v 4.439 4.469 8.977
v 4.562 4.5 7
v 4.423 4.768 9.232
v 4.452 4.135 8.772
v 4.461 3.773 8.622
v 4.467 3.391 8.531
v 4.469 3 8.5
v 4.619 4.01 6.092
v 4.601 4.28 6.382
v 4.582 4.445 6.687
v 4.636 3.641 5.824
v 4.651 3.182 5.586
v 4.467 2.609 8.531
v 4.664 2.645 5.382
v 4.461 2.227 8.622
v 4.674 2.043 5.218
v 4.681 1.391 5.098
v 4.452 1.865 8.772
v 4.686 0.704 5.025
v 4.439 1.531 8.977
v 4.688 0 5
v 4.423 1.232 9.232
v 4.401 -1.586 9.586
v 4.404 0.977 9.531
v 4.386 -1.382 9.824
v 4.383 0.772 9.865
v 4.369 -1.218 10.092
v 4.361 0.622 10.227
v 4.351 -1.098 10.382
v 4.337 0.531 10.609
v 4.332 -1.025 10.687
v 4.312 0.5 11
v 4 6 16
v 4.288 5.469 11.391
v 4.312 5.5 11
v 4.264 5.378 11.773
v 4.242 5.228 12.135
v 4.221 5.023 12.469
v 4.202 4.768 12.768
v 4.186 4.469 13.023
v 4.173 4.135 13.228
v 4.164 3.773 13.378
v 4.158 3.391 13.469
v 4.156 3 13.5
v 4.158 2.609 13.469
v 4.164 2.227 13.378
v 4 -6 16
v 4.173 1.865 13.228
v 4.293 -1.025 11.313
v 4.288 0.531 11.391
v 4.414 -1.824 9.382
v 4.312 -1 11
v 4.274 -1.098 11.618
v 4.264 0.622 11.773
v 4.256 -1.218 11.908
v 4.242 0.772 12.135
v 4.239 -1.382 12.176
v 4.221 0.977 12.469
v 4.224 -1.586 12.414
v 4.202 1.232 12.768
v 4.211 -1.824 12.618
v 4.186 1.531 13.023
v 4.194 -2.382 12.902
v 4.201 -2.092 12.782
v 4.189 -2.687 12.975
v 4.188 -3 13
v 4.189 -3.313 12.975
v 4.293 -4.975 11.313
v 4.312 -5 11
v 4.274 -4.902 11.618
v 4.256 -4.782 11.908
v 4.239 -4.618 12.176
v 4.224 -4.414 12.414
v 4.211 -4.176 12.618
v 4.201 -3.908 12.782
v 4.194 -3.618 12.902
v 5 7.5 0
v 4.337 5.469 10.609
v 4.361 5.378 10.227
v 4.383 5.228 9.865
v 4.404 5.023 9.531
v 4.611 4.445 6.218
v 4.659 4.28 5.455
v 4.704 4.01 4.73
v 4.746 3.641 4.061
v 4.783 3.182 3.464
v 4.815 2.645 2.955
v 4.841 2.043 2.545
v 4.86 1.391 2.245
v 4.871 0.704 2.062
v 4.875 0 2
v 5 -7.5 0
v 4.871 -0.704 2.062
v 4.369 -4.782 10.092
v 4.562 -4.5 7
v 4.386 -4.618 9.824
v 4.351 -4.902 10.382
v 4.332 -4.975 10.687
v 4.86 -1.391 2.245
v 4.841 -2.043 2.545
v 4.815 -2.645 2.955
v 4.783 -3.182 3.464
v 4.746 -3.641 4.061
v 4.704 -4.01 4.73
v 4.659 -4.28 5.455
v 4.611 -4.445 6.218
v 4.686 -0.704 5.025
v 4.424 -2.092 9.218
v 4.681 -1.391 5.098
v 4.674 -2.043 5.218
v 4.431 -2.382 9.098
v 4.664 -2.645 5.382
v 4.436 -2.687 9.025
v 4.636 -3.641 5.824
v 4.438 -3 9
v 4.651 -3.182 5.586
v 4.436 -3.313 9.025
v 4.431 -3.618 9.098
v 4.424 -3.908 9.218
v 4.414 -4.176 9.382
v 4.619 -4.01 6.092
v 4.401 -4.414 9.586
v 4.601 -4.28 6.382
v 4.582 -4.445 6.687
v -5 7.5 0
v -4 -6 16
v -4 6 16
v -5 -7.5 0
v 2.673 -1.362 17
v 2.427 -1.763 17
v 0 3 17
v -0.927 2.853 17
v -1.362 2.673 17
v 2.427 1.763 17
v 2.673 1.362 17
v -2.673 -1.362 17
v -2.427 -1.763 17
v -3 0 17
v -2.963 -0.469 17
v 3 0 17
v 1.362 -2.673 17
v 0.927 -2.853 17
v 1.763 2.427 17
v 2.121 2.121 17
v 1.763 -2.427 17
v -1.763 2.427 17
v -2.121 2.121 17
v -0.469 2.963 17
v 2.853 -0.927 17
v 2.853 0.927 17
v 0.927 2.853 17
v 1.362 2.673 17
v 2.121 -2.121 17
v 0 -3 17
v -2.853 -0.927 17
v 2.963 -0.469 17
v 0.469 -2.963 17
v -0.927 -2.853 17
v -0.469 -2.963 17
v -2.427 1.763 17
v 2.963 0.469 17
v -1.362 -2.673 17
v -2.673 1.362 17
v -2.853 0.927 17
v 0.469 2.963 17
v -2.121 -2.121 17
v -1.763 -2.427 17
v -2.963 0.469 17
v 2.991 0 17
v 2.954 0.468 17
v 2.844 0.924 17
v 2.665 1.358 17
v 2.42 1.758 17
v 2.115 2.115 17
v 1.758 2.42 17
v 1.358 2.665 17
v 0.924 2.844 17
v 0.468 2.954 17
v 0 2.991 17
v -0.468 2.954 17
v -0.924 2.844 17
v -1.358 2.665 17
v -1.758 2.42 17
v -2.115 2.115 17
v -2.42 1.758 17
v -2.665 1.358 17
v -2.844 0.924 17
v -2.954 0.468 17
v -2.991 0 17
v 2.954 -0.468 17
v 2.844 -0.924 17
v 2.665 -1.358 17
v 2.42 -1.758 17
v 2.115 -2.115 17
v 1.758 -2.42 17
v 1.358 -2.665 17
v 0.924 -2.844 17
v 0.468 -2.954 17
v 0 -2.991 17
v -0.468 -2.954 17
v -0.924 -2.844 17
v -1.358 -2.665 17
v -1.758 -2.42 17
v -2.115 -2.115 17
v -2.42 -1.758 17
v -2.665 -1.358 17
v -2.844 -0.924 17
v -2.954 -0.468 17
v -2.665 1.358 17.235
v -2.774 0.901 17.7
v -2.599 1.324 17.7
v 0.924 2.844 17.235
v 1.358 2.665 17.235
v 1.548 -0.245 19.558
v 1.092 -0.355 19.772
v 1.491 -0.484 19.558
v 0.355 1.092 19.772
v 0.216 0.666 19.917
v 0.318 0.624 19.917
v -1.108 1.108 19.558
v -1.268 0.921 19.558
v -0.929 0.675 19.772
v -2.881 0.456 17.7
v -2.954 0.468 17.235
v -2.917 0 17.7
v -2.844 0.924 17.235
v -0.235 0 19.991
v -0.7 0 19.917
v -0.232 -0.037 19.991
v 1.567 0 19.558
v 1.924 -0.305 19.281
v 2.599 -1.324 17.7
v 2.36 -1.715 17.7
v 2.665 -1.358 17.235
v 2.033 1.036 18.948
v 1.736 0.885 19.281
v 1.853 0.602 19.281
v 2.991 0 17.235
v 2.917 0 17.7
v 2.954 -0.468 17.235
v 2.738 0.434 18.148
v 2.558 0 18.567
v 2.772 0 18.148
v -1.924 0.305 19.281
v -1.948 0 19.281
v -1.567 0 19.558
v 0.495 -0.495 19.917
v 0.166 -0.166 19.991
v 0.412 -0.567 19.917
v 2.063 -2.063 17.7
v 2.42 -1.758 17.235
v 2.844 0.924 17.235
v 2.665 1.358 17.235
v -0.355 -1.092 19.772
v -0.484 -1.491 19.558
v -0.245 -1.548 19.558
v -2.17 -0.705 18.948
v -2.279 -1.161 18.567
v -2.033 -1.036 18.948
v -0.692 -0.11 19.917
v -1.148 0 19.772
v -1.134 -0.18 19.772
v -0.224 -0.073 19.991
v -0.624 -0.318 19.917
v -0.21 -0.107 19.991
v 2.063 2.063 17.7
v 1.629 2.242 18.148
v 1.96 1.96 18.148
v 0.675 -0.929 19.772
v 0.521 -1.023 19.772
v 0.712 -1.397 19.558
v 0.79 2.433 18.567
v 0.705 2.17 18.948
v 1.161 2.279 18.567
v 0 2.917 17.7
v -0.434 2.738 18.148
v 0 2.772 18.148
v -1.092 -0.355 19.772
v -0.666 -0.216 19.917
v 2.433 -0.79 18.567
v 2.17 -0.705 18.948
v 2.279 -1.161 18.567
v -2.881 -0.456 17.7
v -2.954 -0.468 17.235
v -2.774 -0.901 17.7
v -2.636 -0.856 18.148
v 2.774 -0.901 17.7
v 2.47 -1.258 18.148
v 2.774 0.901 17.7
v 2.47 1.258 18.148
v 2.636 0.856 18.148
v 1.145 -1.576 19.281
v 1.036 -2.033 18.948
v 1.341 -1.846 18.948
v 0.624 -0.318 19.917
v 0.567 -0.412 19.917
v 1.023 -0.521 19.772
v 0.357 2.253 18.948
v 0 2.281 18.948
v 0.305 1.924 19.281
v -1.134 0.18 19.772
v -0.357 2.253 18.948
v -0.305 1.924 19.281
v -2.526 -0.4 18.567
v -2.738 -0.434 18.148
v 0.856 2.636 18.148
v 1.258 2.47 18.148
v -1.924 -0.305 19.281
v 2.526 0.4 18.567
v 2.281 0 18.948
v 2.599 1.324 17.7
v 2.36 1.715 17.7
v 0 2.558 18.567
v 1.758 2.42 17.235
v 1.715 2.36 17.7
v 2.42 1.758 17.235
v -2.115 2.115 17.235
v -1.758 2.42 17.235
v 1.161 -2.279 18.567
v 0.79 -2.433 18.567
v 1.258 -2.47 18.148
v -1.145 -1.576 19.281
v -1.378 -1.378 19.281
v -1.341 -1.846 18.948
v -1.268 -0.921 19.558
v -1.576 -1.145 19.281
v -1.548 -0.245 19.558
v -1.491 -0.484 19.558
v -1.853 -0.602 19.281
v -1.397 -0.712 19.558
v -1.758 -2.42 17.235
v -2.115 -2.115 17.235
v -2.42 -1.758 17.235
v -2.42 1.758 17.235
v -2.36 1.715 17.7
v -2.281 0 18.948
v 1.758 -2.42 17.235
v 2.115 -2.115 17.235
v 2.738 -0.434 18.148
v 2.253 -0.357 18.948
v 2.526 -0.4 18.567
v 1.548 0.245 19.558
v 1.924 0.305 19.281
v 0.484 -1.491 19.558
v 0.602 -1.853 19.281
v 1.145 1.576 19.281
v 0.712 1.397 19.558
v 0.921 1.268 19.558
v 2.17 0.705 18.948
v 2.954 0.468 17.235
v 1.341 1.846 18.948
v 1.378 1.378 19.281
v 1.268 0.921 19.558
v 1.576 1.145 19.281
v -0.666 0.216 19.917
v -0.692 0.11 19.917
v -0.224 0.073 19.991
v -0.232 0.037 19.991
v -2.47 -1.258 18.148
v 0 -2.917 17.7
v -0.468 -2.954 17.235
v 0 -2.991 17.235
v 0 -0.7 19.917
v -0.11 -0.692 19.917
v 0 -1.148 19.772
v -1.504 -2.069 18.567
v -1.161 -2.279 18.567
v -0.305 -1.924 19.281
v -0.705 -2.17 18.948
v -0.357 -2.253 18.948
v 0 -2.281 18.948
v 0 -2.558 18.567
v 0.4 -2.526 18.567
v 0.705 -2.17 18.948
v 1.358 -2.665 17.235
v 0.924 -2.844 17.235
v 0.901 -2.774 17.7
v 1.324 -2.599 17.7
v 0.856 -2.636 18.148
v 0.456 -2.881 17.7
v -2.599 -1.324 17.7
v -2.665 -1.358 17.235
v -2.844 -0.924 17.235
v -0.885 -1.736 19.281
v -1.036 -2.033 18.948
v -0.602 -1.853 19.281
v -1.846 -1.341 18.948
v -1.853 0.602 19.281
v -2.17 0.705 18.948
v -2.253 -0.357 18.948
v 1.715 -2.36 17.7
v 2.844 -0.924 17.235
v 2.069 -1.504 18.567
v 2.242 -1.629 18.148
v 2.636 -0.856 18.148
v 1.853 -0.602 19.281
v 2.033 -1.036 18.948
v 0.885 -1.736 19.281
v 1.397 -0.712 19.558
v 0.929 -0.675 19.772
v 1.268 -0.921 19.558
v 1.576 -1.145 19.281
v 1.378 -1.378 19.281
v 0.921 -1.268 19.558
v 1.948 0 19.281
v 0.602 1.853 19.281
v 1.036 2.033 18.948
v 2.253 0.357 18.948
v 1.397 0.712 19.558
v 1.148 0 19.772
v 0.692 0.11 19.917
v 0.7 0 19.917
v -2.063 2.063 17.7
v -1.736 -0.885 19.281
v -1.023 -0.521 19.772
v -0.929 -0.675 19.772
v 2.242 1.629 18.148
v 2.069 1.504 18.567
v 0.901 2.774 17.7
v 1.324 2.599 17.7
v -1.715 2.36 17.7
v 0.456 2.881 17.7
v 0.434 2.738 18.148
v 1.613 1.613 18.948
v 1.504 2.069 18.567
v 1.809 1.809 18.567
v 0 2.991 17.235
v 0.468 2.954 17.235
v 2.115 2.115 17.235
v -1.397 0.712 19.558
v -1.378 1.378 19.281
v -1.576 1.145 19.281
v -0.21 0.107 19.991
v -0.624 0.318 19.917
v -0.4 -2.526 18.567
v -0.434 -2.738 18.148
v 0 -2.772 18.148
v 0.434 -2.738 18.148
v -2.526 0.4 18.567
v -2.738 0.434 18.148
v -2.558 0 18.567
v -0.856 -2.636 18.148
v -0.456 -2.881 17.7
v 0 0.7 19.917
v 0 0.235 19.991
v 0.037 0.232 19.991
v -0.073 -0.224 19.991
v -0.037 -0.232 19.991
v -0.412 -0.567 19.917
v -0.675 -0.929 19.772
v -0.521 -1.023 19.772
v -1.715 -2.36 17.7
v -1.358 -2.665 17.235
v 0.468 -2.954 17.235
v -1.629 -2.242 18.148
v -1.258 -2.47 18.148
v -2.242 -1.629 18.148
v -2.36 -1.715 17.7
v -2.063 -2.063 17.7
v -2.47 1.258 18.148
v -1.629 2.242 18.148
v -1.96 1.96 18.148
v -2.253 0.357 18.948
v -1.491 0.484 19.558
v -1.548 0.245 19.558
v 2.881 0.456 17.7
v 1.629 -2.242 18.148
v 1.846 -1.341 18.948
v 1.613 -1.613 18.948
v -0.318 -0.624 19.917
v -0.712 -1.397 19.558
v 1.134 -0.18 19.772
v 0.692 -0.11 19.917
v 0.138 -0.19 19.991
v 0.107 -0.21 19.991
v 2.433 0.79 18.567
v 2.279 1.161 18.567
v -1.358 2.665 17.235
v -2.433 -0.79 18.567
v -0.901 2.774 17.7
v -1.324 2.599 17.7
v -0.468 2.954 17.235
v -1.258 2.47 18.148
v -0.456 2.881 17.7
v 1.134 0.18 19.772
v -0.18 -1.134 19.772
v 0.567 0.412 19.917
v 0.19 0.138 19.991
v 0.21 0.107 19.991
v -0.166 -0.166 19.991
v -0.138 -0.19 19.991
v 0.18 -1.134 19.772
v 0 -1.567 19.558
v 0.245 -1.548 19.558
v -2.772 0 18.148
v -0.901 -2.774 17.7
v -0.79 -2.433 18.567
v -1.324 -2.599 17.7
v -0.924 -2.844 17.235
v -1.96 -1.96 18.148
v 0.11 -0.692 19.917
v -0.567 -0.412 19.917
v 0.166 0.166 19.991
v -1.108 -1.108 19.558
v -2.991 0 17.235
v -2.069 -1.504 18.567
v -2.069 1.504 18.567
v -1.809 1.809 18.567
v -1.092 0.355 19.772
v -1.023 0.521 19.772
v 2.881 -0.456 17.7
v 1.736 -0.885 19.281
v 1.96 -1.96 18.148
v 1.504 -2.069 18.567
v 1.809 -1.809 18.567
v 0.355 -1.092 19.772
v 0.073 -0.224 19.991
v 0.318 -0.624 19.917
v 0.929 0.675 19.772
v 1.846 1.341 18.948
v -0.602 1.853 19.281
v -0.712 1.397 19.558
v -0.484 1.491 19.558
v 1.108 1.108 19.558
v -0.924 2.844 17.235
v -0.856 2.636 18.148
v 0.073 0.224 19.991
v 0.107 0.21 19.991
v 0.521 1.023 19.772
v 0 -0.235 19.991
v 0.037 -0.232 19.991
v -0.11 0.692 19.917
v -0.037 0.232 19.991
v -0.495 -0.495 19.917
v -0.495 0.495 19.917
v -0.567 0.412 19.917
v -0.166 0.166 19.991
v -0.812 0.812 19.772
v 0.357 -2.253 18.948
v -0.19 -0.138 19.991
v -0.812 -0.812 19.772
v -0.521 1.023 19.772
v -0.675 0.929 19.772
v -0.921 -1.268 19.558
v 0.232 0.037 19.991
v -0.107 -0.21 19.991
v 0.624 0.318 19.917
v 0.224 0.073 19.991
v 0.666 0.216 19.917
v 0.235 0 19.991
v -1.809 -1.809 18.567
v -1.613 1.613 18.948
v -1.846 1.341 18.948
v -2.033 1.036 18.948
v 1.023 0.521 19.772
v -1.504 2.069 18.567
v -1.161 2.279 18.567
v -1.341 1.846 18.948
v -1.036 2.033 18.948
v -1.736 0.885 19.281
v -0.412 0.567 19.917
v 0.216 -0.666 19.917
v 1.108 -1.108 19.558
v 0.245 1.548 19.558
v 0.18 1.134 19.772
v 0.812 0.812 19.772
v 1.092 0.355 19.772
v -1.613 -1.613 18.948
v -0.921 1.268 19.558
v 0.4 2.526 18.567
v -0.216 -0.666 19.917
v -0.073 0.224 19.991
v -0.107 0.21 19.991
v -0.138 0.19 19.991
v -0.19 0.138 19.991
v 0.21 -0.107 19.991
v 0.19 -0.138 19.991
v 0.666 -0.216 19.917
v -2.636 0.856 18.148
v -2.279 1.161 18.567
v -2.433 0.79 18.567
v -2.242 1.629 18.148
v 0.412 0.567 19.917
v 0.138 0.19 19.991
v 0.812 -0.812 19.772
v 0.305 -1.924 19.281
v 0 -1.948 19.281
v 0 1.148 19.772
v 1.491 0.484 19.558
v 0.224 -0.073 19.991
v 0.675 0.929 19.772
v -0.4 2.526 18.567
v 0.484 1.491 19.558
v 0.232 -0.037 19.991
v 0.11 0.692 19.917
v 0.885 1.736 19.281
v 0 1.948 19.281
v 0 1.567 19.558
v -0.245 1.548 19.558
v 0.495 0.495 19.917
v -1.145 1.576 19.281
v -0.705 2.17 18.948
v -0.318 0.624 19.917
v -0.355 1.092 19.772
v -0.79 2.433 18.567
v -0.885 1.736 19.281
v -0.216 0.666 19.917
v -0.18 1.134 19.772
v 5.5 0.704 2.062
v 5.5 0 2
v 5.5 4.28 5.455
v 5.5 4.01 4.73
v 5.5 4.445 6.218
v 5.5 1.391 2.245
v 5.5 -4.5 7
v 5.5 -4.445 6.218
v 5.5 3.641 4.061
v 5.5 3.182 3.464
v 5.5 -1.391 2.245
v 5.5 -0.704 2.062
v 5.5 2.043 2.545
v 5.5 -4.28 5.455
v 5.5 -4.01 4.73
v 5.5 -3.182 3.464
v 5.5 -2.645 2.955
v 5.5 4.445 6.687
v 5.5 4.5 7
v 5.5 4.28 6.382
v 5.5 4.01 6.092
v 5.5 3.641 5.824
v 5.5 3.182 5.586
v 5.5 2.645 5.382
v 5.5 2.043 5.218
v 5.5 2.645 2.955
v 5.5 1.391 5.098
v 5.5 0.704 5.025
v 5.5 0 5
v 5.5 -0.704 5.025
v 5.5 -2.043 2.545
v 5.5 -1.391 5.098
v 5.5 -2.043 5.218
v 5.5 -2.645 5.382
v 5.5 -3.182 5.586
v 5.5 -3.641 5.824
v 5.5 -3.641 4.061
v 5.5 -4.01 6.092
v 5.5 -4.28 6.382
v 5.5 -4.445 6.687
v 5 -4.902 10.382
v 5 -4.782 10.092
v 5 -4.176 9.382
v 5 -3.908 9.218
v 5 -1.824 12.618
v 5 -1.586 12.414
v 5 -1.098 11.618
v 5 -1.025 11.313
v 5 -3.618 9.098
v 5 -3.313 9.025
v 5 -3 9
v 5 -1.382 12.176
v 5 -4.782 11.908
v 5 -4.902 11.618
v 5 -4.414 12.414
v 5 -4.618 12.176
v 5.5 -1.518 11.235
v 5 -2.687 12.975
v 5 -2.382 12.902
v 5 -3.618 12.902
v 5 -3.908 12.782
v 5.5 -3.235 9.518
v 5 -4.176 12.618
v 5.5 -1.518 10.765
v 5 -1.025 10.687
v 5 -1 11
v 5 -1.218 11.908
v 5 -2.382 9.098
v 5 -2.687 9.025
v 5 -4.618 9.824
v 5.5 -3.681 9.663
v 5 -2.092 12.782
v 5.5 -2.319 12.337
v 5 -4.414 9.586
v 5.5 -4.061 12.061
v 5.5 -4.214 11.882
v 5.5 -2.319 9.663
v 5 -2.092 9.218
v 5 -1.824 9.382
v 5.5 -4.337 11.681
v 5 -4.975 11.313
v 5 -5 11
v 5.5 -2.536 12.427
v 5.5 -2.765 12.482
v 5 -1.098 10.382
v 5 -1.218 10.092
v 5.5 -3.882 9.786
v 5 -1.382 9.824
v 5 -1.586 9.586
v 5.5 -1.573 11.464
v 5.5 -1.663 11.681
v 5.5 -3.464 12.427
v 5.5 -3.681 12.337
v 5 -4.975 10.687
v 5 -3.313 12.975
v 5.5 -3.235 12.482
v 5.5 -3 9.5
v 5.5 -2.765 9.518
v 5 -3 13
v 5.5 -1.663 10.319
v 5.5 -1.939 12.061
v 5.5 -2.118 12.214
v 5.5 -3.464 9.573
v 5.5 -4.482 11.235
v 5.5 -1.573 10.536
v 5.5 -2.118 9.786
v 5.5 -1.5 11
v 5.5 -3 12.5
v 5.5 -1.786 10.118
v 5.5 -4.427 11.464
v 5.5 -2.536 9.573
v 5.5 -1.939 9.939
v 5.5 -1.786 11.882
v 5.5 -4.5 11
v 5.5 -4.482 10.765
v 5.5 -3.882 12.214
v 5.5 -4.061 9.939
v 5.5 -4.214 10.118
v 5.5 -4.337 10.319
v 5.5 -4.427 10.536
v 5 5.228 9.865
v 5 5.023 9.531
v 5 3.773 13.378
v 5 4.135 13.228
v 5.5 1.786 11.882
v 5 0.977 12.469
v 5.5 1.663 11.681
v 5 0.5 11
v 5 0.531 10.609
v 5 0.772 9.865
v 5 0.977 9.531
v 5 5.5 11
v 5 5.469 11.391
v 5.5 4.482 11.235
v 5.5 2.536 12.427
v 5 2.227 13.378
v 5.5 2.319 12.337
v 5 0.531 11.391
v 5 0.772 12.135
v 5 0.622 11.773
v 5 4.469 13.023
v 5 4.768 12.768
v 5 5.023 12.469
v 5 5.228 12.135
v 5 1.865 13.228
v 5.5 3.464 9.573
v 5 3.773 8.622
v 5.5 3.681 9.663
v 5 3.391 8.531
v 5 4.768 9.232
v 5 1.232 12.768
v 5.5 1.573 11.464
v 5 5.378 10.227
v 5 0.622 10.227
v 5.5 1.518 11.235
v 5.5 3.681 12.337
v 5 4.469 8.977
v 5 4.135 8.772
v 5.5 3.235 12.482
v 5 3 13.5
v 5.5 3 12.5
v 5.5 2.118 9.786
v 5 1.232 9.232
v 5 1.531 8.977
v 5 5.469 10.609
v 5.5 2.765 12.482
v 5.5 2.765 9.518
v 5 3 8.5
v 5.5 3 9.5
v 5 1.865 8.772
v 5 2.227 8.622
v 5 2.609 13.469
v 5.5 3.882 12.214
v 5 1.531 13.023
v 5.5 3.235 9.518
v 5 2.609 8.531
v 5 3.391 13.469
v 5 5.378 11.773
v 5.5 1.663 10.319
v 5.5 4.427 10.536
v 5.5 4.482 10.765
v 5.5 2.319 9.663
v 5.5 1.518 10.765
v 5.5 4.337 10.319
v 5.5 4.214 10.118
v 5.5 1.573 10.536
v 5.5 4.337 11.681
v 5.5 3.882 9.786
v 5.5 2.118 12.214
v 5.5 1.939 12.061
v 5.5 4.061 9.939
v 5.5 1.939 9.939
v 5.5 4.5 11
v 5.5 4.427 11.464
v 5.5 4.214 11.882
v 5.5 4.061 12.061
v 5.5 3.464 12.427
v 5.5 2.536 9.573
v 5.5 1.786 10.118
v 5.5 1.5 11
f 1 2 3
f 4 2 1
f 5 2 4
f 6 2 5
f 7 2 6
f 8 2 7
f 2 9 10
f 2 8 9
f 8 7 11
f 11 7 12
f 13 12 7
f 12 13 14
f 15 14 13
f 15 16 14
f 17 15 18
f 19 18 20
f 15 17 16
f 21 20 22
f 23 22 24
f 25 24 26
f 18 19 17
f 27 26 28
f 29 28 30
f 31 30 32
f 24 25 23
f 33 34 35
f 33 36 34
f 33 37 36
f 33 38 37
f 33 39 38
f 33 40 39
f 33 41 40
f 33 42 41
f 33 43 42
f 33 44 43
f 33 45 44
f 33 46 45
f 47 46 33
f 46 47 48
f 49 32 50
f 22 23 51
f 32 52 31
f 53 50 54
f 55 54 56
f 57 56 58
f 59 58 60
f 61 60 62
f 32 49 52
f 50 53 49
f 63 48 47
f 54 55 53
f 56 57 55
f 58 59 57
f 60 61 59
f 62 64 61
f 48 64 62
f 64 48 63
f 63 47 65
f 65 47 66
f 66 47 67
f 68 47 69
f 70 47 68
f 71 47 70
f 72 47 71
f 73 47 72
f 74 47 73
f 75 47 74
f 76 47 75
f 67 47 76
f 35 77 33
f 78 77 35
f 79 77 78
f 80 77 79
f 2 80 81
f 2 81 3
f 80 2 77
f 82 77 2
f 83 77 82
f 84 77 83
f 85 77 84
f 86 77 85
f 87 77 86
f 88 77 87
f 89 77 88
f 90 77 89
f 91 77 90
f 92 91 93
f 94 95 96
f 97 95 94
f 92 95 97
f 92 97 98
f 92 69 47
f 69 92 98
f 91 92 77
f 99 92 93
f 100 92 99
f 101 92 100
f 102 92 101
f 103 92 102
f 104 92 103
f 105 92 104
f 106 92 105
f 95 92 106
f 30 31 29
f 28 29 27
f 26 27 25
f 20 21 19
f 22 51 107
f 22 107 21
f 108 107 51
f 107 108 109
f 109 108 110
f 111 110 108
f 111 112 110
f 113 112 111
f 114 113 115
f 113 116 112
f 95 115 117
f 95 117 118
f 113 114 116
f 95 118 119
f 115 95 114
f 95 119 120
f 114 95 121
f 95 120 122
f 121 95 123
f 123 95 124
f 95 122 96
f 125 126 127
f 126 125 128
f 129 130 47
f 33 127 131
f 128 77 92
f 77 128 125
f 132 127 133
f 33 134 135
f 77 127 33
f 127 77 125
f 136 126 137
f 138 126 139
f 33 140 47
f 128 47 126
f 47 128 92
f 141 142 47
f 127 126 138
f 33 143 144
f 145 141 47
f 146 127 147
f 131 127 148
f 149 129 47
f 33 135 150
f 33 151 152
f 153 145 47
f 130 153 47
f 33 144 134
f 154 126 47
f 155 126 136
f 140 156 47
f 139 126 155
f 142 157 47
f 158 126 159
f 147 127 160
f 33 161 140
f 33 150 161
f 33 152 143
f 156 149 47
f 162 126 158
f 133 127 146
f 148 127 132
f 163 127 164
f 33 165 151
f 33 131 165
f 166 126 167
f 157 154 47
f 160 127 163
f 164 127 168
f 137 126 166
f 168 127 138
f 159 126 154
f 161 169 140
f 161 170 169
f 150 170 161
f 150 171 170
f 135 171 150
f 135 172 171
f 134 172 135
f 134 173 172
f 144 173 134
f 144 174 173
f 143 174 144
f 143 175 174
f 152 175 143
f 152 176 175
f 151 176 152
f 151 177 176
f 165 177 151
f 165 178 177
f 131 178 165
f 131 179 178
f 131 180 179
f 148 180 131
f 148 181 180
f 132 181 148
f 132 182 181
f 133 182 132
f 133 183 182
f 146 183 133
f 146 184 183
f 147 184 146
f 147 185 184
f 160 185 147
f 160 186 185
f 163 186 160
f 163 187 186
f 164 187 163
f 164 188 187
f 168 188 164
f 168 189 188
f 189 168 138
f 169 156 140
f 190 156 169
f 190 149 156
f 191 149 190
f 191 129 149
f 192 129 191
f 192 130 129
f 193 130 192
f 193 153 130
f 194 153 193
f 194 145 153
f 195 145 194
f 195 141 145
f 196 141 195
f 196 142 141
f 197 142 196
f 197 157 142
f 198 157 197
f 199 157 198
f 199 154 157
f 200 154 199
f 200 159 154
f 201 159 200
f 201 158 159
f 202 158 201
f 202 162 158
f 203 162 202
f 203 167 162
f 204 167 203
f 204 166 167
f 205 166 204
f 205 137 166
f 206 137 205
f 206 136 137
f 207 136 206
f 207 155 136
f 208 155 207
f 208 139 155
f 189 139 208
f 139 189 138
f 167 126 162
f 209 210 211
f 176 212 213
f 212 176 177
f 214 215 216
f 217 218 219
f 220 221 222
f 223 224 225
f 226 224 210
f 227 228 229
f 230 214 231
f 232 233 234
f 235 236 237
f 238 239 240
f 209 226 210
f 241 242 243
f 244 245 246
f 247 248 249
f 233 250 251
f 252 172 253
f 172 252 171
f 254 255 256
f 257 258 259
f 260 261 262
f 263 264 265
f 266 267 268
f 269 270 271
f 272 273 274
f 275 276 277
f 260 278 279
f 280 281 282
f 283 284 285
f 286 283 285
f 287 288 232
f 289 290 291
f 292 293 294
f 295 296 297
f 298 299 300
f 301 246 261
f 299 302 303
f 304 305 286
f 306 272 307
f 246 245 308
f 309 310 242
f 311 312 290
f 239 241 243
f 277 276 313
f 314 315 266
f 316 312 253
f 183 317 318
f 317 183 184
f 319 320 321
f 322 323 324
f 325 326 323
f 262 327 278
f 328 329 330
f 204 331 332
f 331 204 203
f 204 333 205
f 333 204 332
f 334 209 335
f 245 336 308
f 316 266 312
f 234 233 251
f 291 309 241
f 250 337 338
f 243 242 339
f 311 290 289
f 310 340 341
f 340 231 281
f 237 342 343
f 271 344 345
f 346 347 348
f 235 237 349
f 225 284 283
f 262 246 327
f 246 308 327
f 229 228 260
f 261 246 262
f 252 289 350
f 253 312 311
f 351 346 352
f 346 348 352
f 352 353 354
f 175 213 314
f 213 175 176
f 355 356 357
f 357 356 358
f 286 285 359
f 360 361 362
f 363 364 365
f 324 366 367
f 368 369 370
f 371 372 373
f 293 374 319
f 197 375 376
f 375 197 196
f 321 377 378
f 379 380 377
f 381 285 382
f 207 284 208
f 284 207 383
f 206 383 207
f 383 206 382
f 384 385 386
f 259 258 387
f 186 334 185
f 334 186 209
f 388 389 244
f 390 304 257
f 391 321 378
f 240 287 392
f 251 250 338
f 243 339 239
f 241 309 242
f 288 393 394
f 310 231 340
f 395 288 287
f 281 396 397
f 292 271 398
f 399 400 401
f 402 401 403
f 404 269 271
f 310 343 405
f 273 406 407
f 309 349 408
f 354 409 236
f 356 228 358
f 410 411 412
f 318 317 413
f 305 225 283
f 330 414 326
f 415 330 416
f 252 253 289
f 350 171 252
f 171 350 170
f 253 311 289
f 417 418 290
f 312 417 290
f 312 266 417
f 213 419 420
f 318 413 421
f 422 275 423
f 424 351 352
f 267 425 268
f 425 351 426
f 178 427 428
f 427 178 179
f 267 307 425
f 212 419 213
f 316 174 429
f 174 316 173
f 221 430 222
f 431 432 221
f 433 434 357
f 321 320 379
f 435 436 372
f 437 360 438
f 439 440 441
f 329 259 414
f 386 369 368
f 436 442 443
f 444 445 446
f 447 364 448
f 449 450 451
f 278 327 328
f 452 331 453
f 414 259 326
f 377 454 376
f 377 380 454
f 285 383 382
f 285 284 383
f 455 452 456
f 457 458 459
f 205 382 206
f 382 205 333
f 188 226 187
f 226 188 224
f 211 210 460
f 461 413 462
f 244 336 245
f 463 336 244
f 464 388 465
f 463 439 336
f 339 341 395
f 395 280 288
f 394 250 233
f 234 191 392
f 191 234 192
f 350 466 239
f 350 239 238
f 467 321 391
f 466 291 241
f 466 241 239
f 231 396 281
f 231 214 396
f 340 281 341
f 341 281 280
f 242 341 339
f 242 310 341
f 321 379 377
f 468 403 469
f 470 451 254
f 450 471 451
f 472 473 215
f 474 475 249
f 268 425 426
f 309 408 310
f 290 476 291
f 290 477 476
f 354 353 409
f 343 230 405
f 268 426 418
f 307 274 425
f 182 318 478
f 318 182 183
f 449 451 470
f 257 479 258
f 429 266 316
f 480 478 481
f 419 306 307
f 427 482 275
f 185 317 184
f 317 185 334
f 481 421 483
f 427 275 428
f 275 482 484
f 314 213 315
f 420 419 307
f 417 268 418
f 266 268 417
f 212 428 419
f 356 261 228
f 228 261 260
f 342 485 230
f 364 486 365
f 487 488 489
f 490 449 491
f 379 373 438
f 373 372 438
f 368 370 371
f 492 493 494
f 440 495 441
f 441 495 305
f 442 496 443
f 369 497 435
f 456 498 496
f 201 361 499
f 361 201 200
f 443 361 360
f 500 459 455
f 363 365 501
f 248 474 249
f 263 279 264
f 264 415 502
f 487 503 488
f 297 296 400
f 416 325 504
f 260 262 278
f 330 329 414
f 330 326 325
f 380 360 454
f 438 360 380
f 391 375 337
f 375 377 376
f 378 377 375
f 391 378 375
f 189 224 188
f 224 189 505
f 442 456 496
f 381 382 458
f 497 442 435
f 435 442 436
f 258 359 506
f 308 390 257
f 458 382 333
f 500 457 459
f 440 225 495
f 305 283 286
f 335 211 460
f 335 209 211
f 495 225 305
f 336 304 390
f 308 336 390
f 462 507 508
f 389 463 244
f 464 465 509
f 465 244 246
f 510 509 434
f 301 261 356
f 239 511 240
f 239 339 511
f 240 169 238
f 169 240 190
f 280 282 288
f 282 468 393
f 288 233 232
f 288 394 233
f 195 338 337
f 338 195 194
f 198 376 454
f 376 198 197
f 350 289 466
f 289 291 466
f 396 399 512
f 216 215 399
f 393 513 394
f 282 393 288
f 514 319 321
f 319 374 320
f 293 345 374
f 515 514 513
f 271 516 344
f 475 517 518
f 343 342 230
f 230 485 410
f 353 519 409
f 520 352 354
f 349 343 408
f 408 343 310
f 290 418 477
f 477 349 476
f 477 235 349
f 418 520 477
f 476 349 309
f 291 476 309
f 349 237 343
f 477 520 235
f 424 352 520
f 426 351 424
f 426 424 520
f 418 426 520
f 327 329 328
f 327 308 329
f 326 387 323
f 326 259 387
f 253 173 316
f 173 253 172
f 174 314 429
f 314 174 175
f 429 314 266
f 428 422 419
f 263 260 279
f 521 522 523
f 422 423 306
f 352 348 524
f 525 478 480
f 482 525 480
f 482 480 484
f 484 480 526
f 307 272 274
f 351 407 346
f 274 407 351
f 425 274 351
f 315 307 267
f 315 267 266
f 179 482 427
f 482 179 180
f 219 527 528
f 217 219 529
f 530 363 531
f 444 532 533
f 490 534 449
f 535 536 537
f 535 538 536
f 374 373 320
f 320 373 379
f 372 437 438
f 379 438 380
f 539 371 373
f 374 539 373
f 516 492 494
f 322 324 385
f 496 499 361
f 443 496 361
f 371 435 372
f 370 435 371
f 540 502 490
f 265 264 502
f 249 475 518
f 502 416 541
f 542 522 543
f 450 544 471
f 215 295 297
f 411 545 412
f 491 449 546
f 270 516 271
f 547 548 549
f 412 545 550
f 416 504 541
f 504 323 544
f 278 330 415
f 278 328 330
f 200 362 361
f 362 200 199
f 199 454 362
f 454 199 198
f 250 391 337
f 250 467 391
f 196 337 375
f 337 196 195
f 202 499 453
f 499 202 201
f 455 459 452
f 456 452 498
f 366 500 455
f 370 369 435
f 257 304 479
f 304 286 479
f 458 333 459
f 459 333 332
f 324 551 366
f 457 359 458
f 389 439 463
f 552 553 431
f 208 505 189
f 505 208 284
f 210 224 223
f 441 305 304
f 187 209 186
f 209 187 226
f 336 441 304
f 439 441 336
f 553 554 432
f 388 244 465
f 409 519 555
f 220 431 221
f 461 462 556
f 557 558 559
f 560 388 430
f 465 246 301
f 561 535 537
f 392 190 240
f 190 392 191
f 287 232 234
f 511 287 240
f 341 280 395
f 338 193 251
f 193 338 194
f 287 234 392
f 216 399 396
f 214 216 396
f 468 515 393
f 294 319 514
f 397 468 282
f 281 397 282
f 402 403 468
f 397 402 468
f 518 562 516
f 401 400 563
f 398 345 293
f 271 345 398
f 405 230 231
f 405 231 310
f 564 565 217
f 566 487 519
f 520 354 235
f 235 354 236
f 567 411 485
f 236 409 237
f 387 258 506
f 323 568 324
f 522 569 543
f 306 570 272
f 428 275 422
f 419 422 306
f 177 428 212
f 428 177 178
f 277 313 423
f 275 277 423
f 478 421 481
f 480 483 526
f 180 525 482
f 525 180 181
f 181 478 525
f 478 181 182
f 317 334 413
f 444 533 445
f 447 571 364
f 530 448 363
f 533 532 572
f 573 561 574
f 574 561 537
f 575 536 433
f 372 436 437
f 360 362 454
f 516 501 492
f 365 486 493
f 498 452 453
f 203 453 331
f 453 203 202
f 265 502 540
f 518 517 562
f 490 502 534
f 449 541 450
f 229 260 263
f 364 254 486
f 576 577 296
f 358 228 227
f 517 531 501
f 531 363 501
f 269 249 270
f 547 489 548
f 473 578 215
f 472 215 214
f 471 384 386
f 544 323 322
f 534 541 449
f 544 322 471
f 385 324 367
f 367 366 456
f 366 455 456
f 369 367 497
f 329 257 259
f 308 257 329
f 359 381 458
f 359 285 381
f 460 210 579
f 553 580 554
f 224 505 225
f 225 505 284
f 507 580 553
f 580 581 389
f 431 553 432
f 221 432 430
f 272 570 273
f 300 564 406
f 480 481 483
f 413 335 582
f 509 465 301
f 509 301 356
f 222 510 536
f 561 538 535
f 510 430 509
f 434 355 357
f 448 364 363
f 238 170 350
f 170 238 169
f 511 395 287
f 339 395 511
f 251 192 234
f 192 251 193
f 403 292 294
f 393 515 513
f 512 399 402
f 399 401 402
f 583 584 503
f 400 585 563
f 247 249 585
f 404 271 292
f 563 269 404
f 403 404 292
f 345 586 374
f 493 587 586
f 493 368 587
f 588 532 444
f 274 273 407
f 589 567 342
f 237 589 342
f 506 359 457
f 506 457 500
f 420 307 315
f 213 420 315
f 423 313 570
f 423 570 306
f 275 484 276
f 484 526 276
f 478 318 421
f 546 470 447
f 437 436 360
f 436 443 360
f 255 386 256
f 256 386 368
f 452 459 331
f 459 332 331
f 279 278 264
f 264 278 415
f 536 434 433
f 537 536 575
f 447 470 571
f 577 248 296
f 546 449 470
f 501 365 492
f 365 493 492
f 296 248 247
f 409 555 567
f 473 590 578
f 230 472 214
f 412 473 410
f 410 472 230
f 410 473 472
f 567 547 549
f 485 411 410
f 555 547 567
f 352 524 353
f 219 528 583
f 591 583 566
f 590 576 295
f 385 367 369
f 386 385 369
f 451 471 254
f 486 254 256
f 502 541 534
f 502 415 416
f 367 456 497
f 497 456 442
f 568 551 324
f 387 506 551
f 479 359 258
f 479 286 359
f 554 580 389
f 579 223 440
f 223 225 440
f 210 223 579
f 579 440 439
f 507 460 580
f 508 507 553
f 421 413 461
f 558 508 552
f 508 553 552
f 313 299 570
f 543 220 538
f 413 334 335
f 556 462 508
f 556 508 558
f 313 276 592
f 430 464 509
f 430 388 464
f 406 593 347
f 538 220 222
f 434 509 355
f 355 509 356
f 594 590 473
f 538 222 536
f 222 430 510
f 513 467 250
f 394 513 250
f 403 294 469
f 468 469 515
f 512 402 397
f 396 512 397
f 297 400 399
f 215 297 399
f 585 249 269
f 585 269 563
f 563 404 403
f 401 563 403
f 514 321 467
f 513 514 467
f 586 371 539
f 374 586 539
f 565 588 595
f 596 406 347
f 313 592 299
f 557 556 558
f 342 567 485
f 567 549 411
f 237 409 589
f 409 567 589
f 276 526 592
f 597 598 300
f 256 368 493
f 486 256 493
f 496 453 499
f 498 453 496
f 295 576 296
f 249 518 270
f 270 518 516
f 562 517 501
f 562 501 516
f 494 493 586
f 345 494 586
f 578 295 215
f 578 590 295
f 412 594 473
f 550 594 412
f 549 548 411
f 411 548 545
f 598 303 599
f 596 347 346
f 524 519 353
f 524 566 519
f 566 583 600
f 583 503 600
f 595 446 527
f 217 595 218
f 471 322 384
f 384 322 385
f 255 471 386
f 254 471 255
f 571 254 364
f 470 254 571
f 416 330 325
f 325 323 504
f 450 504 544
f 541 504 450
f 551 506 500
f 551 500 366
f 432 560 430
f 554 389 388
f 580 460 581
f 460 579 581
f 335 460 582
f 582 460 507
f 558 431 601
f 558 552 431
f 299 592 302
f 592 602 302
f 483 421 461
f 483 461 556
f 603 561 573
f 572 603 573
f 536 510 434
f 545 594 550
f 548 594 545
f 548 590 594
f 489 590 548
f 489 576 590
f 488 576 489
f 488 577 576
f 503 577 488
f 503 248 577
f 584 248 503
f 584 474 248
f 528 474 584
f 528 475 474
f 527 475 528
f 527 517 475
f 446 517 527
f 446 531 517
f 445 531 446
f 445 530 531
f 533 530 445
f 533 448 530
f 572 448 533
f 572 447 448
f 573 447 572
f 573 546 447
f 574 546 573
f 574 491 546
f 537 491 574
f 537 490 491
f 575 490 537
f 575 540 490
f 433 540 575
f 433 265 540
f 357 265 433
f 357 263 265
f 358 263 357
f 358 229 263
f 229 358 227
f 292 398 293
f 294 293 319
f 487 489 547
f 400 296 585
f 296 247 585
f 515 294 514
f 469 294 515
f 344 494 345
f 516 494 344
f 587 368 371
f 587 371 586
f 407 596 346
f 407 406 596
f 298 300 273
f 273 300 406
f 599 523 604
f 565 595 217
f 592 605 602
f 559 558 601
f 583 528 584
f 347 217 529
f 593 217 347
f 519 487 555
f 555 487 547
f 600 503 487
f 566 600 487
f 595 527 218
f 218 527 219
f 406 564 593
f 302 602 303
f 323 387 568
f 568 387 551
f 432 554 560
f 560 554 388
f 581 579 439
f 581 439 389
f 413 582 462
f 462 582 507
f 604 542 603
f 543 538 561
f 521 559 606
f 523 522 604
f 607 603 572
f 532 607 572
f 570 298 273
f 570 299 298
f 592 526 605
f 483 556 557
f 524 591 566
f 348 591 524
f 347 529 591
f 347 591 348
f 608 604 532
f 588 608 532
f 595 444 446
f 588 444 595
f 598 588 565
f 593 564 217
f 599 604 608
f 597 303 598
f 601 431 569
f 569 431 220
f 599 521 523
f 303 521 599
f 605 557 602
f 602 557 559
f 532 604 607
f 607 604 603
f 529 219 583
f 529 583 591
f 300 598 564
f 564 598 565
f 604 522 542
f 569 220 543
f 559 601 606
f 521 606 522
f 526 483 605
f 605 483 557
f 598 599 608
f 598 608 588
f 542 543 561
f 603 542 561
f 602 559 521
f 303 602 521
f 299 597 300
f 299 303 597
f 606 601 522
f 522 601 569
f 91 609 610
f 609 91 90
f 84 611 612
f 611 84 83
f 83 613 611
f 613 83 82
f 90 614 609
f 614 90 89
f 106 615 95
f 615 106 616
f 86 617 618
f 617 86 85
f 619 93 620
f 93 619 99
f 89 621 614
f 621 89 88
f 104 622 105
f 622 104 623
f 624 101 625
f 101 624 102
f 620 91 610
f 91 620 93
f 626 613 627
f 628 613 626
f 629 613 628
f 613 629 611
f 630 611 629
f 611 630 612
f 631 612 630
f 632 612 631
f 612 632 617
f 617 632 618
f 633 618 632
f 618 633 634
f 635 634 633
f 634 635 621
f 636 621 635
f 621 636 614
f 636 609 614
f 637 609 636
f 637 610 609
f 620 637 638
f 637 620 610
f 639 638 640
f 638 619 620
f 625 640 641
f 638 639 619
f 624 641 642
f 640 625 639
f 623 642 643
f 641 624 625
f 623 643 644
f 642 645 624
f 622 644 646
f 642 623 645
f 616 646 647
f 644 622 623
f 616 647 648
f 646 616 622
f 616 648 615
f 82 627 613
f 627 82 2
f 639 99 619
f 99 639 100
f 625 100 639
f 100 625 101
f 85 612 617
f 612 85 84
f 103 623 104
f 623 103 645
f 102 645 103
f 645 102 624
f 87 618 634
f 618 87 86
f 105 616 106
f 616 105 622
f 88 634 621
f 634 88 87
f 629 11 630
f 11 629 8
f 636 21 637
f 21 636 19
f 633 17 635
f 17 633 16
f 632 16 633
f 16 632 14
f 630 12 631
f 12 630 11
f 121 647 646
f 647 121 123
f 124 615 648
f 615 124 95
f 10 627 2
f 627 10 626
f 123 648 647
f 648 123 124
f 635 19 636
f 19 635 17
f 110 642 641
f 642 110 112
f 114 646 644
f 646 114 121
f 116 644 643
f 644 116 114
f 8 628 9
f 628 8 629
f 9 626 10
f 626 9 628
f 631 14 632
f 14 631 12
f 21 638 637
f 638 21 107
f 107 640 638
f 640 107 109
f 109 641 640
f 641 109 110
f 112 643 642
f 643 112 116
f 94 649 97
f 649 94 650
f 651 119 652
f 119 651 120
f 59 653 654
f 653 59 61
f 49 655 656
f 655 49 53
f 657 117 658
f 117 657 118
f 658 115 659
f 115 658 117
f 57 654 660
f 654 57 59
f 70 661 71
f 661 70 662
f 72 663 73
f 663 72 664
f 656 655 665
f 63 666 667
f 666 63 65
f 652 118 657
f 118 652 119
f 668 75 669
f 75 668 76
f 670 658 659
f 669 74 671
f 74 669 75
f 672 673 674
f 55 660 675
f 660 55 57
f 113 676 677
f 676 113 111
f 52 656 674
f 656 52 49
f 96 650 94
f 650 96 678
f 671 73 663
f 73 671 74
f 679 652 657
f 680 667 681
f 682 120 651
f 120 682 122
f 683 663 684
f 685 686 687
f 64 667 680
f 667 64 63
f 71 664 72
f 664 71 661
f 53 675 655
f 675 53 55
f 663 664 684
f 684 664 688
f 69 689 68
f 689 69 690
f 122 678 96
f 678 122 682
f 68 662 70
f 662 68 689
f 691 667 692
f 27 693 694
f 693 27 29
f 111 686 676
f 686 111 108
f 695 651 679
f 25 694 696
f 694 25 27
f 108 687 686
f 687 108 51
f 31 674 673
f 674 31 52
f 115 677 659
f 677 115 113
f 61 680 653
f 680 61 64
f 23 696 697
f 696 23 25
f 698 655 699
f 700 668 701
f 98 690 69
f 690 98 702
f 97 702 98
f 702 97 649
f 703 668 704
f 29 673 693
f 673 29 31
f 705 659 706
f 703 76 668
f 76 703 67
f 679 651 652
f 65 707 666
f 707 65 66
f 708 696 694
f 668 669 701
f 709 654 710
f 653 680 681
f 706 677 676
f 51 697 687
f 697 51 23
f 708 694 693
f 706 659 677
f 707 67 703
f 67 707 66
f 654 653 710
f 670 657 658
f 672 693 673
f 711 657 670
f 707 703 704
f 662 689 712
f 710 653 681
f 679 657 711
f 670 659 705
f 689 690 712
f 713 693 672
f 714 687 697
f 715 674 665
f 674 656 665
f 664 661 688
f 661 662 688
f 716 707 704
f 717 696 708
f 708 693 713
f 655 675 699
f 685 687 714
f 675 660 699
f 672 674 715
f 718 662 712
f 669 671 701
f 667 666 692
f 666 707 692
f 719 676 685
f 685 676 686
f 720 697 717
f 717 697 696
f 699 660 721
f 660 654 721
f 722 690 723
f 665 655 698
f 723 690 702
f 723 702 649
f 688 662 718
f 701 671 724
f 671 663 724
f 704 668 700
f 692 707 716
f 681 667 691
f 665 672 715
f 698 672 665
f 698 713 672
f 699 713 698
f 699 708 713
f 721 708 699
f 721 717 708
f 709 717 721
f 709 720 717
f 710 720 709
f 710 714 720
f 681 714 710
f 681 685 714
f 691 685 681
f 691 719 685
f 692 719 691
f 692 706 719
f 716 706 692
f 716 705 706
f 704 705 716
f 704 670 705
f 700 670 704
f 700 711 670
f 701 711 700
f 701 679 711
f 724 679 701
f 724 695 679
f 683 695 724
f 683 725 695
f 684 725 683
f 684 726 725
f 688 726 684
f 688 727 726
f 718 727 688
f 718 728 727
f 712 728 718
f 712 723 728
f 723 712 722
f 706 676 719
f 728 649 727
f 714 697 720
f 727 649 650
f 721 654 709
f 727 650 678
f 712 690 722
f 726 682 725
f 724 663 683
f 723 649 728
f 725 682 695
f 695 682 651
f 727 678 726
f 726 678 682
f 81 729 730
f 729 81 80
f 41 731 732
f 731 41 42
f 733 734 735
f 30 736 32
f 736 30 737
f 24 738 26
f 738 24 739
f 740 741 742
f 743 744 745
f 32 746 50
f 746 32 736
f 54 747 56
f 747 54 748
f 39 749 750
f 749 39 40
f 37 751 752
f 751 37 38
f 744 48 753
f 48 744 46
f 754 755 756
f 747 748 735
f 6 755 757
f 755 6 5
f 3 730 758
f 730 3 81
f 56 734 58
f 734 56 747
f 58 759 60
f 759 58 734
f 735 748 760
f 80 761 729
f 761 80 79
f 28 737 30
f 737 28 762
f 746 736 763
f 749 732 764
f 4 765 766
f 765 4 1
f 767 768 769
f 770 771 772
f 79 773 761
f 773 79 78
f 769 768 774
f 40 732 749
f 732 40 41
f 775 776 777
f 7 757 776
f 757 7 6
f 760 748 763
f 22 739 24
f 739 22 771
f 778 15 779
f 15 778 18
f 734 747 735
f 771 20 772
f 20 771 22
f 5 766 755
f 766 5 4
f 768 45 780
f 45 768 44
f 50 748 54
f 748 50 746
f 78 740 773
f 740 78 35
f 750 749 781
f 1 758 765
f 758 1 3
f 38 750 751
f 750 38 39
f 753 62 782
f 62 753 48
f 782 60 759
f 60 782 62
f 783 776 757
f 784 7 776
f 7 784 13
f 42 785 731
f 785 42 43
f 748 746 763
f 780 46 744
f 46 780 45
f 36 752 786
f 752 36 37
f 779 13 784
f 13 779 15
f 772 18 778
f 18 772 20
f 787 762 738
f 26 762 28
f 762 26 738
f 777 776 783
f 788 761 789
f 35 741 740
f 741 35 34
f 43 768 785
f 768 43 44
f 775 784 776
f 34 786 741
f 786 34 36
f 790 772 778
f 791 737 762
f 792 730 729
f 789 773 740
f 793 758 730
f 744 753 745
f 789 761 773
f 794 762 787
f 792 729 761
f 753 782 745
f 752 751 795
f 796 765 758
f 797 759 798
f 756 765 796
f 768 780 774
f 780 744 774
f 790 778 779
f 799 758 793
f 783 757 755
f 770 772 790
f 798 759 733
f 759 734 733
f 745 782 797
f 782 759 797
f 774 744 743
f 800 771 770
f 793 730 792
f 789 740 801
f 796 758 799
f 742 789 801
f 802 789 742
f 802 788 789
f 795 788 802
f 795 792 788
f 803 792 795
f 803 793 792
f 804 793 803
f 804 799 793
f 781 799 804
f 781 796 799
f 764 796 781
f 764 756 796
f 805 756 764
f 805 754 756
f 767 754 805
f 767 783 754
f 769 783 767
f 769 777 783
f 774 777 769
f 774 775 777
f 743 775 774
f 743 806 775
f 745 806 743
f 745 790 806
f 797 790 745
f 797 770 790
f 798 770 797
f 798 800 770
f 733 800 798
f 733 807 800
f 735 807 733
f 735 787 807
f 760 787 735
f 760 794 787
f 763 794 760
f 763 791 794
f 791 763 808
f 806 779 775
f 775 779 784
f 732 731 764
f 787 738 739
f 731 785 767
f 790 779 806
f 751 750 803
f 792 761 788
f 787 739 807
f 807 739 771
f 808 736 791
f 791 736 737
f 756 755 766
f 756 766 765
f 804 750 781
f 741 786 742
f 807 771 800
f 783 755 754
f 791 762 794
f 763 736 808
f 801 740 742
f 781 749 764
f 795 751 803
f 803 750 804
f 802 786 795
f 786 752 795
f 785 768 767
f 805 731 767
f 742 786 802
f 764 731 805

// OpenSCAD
$fn = 40;

module body(
  body_height,
  body_width,
  body_depth,
  body_taper,
  mount_radius,
  mount_protude,
  ) {
  hull() {
    linear_extrude(height=body_height, scale=body_taper) {
      square([body_depth, body_width], center=true);
    }
    cylinder(r=mount_radius, h=body_height+mount_protude);
  }
  translate([0, 0, body_height+mount_protude]) {
    sphere(r=mount_radius);
  }
}

module eye(
  base_radius,
  base_protude,
  inner_radius,
  inner_protude,
  right_from_center,
  height_from_base,
  ) {
  hull() {
    translate([0, right_from_center, height_from_base]) {
      rotate(90, [0, 1, 0]) {
        cylinder(r=base_radius, h=base_protude);
      }
    }
    translate([0, right_from_center, height_from_base]) {
      rotate(90, [0, 1, 0]) {
        cylinder(r=inner_radius, h=base_protude + inner_protude);
      }
    }
  }
}

module mouth(
  width,
  height,
  droop,
  base_protude,
  height_from_base) {
  translate([0, 0, height_from_base+height]) {
    rotate(90, [0, 0, 1]) {
      rotate(90, [1, 0, 0]) {
        difference() {
          difference() {
            scale([1, 2*height/width, 1]) {
              cylinder(r=width/2,h=base_protude);
            }
            translate([0, 0, -0.01]) {
              scale([1, 2*droop/width, 1.02]) {
                cylinder(r=width/2,h=base_protude);
              }
            }
          }
          translate([-0.5*width, 0, 0]) {
            translate([0, 0, -0.01]) {
              scale([1, 1, 1.02]) {
                cube([width, height, base_protude]);
              }
            }
          }    
        }
      }
    }
  }
}

module RGB_BO (
  body_height,
  body_width,
  body_depth,
  body_taper,
  mount_radius,
  mount_protude,
  face_feature_protude,
  left_eye_radius,
  right_eye_radius,
  eye_off_center,
  eye_height_from_base,
  eyeball_radius,
  eyeball_protude,
  mouth_height,
  mouth_droop,
  mouth_width,
  mouth_height_from_base,
  ) {
  
  body(
    body_height,
    body_width,
    body_depth,
    body_taper,
    mount_radius,
    mount_protude);
  
  mouth(
    mouth_width,
    mouth_height,
    mouth_droop,
    face_feature_protude + eyeball_protude,
    mouth_height_from_base);
  
  eye(
    left_eye_radius,
    face_feature_protude,
    eyeball_radius,
    eyeball_protude,
    -1 * eye_off_center,
    eye_height_from_base);
  
  eye(
    right_eye_radius,
    face_feature_protude,
    eyeball_radius,
    eyeball_protude,
    eye_off_center,
    eye_height_from_base);
}

RGB_BO(
  body_height=16,
  body_width=15,
  body_depth=10,
  body_taper=0.8,
  
  mount_radius=3,
  mount_protude=1,
  face_feature_protude=5,
  left_eye_radius=2,
  right_eye_radius=2.5,
  eye_off_center=3,
  eye_height_from_base=11,
  eyeball_radius=1.5,
  eyeball_protude=0.5,
  mouth_height=5,
  mouth_droop=2,
  mouth_width=9,
  mouth_height_from_base=2);
